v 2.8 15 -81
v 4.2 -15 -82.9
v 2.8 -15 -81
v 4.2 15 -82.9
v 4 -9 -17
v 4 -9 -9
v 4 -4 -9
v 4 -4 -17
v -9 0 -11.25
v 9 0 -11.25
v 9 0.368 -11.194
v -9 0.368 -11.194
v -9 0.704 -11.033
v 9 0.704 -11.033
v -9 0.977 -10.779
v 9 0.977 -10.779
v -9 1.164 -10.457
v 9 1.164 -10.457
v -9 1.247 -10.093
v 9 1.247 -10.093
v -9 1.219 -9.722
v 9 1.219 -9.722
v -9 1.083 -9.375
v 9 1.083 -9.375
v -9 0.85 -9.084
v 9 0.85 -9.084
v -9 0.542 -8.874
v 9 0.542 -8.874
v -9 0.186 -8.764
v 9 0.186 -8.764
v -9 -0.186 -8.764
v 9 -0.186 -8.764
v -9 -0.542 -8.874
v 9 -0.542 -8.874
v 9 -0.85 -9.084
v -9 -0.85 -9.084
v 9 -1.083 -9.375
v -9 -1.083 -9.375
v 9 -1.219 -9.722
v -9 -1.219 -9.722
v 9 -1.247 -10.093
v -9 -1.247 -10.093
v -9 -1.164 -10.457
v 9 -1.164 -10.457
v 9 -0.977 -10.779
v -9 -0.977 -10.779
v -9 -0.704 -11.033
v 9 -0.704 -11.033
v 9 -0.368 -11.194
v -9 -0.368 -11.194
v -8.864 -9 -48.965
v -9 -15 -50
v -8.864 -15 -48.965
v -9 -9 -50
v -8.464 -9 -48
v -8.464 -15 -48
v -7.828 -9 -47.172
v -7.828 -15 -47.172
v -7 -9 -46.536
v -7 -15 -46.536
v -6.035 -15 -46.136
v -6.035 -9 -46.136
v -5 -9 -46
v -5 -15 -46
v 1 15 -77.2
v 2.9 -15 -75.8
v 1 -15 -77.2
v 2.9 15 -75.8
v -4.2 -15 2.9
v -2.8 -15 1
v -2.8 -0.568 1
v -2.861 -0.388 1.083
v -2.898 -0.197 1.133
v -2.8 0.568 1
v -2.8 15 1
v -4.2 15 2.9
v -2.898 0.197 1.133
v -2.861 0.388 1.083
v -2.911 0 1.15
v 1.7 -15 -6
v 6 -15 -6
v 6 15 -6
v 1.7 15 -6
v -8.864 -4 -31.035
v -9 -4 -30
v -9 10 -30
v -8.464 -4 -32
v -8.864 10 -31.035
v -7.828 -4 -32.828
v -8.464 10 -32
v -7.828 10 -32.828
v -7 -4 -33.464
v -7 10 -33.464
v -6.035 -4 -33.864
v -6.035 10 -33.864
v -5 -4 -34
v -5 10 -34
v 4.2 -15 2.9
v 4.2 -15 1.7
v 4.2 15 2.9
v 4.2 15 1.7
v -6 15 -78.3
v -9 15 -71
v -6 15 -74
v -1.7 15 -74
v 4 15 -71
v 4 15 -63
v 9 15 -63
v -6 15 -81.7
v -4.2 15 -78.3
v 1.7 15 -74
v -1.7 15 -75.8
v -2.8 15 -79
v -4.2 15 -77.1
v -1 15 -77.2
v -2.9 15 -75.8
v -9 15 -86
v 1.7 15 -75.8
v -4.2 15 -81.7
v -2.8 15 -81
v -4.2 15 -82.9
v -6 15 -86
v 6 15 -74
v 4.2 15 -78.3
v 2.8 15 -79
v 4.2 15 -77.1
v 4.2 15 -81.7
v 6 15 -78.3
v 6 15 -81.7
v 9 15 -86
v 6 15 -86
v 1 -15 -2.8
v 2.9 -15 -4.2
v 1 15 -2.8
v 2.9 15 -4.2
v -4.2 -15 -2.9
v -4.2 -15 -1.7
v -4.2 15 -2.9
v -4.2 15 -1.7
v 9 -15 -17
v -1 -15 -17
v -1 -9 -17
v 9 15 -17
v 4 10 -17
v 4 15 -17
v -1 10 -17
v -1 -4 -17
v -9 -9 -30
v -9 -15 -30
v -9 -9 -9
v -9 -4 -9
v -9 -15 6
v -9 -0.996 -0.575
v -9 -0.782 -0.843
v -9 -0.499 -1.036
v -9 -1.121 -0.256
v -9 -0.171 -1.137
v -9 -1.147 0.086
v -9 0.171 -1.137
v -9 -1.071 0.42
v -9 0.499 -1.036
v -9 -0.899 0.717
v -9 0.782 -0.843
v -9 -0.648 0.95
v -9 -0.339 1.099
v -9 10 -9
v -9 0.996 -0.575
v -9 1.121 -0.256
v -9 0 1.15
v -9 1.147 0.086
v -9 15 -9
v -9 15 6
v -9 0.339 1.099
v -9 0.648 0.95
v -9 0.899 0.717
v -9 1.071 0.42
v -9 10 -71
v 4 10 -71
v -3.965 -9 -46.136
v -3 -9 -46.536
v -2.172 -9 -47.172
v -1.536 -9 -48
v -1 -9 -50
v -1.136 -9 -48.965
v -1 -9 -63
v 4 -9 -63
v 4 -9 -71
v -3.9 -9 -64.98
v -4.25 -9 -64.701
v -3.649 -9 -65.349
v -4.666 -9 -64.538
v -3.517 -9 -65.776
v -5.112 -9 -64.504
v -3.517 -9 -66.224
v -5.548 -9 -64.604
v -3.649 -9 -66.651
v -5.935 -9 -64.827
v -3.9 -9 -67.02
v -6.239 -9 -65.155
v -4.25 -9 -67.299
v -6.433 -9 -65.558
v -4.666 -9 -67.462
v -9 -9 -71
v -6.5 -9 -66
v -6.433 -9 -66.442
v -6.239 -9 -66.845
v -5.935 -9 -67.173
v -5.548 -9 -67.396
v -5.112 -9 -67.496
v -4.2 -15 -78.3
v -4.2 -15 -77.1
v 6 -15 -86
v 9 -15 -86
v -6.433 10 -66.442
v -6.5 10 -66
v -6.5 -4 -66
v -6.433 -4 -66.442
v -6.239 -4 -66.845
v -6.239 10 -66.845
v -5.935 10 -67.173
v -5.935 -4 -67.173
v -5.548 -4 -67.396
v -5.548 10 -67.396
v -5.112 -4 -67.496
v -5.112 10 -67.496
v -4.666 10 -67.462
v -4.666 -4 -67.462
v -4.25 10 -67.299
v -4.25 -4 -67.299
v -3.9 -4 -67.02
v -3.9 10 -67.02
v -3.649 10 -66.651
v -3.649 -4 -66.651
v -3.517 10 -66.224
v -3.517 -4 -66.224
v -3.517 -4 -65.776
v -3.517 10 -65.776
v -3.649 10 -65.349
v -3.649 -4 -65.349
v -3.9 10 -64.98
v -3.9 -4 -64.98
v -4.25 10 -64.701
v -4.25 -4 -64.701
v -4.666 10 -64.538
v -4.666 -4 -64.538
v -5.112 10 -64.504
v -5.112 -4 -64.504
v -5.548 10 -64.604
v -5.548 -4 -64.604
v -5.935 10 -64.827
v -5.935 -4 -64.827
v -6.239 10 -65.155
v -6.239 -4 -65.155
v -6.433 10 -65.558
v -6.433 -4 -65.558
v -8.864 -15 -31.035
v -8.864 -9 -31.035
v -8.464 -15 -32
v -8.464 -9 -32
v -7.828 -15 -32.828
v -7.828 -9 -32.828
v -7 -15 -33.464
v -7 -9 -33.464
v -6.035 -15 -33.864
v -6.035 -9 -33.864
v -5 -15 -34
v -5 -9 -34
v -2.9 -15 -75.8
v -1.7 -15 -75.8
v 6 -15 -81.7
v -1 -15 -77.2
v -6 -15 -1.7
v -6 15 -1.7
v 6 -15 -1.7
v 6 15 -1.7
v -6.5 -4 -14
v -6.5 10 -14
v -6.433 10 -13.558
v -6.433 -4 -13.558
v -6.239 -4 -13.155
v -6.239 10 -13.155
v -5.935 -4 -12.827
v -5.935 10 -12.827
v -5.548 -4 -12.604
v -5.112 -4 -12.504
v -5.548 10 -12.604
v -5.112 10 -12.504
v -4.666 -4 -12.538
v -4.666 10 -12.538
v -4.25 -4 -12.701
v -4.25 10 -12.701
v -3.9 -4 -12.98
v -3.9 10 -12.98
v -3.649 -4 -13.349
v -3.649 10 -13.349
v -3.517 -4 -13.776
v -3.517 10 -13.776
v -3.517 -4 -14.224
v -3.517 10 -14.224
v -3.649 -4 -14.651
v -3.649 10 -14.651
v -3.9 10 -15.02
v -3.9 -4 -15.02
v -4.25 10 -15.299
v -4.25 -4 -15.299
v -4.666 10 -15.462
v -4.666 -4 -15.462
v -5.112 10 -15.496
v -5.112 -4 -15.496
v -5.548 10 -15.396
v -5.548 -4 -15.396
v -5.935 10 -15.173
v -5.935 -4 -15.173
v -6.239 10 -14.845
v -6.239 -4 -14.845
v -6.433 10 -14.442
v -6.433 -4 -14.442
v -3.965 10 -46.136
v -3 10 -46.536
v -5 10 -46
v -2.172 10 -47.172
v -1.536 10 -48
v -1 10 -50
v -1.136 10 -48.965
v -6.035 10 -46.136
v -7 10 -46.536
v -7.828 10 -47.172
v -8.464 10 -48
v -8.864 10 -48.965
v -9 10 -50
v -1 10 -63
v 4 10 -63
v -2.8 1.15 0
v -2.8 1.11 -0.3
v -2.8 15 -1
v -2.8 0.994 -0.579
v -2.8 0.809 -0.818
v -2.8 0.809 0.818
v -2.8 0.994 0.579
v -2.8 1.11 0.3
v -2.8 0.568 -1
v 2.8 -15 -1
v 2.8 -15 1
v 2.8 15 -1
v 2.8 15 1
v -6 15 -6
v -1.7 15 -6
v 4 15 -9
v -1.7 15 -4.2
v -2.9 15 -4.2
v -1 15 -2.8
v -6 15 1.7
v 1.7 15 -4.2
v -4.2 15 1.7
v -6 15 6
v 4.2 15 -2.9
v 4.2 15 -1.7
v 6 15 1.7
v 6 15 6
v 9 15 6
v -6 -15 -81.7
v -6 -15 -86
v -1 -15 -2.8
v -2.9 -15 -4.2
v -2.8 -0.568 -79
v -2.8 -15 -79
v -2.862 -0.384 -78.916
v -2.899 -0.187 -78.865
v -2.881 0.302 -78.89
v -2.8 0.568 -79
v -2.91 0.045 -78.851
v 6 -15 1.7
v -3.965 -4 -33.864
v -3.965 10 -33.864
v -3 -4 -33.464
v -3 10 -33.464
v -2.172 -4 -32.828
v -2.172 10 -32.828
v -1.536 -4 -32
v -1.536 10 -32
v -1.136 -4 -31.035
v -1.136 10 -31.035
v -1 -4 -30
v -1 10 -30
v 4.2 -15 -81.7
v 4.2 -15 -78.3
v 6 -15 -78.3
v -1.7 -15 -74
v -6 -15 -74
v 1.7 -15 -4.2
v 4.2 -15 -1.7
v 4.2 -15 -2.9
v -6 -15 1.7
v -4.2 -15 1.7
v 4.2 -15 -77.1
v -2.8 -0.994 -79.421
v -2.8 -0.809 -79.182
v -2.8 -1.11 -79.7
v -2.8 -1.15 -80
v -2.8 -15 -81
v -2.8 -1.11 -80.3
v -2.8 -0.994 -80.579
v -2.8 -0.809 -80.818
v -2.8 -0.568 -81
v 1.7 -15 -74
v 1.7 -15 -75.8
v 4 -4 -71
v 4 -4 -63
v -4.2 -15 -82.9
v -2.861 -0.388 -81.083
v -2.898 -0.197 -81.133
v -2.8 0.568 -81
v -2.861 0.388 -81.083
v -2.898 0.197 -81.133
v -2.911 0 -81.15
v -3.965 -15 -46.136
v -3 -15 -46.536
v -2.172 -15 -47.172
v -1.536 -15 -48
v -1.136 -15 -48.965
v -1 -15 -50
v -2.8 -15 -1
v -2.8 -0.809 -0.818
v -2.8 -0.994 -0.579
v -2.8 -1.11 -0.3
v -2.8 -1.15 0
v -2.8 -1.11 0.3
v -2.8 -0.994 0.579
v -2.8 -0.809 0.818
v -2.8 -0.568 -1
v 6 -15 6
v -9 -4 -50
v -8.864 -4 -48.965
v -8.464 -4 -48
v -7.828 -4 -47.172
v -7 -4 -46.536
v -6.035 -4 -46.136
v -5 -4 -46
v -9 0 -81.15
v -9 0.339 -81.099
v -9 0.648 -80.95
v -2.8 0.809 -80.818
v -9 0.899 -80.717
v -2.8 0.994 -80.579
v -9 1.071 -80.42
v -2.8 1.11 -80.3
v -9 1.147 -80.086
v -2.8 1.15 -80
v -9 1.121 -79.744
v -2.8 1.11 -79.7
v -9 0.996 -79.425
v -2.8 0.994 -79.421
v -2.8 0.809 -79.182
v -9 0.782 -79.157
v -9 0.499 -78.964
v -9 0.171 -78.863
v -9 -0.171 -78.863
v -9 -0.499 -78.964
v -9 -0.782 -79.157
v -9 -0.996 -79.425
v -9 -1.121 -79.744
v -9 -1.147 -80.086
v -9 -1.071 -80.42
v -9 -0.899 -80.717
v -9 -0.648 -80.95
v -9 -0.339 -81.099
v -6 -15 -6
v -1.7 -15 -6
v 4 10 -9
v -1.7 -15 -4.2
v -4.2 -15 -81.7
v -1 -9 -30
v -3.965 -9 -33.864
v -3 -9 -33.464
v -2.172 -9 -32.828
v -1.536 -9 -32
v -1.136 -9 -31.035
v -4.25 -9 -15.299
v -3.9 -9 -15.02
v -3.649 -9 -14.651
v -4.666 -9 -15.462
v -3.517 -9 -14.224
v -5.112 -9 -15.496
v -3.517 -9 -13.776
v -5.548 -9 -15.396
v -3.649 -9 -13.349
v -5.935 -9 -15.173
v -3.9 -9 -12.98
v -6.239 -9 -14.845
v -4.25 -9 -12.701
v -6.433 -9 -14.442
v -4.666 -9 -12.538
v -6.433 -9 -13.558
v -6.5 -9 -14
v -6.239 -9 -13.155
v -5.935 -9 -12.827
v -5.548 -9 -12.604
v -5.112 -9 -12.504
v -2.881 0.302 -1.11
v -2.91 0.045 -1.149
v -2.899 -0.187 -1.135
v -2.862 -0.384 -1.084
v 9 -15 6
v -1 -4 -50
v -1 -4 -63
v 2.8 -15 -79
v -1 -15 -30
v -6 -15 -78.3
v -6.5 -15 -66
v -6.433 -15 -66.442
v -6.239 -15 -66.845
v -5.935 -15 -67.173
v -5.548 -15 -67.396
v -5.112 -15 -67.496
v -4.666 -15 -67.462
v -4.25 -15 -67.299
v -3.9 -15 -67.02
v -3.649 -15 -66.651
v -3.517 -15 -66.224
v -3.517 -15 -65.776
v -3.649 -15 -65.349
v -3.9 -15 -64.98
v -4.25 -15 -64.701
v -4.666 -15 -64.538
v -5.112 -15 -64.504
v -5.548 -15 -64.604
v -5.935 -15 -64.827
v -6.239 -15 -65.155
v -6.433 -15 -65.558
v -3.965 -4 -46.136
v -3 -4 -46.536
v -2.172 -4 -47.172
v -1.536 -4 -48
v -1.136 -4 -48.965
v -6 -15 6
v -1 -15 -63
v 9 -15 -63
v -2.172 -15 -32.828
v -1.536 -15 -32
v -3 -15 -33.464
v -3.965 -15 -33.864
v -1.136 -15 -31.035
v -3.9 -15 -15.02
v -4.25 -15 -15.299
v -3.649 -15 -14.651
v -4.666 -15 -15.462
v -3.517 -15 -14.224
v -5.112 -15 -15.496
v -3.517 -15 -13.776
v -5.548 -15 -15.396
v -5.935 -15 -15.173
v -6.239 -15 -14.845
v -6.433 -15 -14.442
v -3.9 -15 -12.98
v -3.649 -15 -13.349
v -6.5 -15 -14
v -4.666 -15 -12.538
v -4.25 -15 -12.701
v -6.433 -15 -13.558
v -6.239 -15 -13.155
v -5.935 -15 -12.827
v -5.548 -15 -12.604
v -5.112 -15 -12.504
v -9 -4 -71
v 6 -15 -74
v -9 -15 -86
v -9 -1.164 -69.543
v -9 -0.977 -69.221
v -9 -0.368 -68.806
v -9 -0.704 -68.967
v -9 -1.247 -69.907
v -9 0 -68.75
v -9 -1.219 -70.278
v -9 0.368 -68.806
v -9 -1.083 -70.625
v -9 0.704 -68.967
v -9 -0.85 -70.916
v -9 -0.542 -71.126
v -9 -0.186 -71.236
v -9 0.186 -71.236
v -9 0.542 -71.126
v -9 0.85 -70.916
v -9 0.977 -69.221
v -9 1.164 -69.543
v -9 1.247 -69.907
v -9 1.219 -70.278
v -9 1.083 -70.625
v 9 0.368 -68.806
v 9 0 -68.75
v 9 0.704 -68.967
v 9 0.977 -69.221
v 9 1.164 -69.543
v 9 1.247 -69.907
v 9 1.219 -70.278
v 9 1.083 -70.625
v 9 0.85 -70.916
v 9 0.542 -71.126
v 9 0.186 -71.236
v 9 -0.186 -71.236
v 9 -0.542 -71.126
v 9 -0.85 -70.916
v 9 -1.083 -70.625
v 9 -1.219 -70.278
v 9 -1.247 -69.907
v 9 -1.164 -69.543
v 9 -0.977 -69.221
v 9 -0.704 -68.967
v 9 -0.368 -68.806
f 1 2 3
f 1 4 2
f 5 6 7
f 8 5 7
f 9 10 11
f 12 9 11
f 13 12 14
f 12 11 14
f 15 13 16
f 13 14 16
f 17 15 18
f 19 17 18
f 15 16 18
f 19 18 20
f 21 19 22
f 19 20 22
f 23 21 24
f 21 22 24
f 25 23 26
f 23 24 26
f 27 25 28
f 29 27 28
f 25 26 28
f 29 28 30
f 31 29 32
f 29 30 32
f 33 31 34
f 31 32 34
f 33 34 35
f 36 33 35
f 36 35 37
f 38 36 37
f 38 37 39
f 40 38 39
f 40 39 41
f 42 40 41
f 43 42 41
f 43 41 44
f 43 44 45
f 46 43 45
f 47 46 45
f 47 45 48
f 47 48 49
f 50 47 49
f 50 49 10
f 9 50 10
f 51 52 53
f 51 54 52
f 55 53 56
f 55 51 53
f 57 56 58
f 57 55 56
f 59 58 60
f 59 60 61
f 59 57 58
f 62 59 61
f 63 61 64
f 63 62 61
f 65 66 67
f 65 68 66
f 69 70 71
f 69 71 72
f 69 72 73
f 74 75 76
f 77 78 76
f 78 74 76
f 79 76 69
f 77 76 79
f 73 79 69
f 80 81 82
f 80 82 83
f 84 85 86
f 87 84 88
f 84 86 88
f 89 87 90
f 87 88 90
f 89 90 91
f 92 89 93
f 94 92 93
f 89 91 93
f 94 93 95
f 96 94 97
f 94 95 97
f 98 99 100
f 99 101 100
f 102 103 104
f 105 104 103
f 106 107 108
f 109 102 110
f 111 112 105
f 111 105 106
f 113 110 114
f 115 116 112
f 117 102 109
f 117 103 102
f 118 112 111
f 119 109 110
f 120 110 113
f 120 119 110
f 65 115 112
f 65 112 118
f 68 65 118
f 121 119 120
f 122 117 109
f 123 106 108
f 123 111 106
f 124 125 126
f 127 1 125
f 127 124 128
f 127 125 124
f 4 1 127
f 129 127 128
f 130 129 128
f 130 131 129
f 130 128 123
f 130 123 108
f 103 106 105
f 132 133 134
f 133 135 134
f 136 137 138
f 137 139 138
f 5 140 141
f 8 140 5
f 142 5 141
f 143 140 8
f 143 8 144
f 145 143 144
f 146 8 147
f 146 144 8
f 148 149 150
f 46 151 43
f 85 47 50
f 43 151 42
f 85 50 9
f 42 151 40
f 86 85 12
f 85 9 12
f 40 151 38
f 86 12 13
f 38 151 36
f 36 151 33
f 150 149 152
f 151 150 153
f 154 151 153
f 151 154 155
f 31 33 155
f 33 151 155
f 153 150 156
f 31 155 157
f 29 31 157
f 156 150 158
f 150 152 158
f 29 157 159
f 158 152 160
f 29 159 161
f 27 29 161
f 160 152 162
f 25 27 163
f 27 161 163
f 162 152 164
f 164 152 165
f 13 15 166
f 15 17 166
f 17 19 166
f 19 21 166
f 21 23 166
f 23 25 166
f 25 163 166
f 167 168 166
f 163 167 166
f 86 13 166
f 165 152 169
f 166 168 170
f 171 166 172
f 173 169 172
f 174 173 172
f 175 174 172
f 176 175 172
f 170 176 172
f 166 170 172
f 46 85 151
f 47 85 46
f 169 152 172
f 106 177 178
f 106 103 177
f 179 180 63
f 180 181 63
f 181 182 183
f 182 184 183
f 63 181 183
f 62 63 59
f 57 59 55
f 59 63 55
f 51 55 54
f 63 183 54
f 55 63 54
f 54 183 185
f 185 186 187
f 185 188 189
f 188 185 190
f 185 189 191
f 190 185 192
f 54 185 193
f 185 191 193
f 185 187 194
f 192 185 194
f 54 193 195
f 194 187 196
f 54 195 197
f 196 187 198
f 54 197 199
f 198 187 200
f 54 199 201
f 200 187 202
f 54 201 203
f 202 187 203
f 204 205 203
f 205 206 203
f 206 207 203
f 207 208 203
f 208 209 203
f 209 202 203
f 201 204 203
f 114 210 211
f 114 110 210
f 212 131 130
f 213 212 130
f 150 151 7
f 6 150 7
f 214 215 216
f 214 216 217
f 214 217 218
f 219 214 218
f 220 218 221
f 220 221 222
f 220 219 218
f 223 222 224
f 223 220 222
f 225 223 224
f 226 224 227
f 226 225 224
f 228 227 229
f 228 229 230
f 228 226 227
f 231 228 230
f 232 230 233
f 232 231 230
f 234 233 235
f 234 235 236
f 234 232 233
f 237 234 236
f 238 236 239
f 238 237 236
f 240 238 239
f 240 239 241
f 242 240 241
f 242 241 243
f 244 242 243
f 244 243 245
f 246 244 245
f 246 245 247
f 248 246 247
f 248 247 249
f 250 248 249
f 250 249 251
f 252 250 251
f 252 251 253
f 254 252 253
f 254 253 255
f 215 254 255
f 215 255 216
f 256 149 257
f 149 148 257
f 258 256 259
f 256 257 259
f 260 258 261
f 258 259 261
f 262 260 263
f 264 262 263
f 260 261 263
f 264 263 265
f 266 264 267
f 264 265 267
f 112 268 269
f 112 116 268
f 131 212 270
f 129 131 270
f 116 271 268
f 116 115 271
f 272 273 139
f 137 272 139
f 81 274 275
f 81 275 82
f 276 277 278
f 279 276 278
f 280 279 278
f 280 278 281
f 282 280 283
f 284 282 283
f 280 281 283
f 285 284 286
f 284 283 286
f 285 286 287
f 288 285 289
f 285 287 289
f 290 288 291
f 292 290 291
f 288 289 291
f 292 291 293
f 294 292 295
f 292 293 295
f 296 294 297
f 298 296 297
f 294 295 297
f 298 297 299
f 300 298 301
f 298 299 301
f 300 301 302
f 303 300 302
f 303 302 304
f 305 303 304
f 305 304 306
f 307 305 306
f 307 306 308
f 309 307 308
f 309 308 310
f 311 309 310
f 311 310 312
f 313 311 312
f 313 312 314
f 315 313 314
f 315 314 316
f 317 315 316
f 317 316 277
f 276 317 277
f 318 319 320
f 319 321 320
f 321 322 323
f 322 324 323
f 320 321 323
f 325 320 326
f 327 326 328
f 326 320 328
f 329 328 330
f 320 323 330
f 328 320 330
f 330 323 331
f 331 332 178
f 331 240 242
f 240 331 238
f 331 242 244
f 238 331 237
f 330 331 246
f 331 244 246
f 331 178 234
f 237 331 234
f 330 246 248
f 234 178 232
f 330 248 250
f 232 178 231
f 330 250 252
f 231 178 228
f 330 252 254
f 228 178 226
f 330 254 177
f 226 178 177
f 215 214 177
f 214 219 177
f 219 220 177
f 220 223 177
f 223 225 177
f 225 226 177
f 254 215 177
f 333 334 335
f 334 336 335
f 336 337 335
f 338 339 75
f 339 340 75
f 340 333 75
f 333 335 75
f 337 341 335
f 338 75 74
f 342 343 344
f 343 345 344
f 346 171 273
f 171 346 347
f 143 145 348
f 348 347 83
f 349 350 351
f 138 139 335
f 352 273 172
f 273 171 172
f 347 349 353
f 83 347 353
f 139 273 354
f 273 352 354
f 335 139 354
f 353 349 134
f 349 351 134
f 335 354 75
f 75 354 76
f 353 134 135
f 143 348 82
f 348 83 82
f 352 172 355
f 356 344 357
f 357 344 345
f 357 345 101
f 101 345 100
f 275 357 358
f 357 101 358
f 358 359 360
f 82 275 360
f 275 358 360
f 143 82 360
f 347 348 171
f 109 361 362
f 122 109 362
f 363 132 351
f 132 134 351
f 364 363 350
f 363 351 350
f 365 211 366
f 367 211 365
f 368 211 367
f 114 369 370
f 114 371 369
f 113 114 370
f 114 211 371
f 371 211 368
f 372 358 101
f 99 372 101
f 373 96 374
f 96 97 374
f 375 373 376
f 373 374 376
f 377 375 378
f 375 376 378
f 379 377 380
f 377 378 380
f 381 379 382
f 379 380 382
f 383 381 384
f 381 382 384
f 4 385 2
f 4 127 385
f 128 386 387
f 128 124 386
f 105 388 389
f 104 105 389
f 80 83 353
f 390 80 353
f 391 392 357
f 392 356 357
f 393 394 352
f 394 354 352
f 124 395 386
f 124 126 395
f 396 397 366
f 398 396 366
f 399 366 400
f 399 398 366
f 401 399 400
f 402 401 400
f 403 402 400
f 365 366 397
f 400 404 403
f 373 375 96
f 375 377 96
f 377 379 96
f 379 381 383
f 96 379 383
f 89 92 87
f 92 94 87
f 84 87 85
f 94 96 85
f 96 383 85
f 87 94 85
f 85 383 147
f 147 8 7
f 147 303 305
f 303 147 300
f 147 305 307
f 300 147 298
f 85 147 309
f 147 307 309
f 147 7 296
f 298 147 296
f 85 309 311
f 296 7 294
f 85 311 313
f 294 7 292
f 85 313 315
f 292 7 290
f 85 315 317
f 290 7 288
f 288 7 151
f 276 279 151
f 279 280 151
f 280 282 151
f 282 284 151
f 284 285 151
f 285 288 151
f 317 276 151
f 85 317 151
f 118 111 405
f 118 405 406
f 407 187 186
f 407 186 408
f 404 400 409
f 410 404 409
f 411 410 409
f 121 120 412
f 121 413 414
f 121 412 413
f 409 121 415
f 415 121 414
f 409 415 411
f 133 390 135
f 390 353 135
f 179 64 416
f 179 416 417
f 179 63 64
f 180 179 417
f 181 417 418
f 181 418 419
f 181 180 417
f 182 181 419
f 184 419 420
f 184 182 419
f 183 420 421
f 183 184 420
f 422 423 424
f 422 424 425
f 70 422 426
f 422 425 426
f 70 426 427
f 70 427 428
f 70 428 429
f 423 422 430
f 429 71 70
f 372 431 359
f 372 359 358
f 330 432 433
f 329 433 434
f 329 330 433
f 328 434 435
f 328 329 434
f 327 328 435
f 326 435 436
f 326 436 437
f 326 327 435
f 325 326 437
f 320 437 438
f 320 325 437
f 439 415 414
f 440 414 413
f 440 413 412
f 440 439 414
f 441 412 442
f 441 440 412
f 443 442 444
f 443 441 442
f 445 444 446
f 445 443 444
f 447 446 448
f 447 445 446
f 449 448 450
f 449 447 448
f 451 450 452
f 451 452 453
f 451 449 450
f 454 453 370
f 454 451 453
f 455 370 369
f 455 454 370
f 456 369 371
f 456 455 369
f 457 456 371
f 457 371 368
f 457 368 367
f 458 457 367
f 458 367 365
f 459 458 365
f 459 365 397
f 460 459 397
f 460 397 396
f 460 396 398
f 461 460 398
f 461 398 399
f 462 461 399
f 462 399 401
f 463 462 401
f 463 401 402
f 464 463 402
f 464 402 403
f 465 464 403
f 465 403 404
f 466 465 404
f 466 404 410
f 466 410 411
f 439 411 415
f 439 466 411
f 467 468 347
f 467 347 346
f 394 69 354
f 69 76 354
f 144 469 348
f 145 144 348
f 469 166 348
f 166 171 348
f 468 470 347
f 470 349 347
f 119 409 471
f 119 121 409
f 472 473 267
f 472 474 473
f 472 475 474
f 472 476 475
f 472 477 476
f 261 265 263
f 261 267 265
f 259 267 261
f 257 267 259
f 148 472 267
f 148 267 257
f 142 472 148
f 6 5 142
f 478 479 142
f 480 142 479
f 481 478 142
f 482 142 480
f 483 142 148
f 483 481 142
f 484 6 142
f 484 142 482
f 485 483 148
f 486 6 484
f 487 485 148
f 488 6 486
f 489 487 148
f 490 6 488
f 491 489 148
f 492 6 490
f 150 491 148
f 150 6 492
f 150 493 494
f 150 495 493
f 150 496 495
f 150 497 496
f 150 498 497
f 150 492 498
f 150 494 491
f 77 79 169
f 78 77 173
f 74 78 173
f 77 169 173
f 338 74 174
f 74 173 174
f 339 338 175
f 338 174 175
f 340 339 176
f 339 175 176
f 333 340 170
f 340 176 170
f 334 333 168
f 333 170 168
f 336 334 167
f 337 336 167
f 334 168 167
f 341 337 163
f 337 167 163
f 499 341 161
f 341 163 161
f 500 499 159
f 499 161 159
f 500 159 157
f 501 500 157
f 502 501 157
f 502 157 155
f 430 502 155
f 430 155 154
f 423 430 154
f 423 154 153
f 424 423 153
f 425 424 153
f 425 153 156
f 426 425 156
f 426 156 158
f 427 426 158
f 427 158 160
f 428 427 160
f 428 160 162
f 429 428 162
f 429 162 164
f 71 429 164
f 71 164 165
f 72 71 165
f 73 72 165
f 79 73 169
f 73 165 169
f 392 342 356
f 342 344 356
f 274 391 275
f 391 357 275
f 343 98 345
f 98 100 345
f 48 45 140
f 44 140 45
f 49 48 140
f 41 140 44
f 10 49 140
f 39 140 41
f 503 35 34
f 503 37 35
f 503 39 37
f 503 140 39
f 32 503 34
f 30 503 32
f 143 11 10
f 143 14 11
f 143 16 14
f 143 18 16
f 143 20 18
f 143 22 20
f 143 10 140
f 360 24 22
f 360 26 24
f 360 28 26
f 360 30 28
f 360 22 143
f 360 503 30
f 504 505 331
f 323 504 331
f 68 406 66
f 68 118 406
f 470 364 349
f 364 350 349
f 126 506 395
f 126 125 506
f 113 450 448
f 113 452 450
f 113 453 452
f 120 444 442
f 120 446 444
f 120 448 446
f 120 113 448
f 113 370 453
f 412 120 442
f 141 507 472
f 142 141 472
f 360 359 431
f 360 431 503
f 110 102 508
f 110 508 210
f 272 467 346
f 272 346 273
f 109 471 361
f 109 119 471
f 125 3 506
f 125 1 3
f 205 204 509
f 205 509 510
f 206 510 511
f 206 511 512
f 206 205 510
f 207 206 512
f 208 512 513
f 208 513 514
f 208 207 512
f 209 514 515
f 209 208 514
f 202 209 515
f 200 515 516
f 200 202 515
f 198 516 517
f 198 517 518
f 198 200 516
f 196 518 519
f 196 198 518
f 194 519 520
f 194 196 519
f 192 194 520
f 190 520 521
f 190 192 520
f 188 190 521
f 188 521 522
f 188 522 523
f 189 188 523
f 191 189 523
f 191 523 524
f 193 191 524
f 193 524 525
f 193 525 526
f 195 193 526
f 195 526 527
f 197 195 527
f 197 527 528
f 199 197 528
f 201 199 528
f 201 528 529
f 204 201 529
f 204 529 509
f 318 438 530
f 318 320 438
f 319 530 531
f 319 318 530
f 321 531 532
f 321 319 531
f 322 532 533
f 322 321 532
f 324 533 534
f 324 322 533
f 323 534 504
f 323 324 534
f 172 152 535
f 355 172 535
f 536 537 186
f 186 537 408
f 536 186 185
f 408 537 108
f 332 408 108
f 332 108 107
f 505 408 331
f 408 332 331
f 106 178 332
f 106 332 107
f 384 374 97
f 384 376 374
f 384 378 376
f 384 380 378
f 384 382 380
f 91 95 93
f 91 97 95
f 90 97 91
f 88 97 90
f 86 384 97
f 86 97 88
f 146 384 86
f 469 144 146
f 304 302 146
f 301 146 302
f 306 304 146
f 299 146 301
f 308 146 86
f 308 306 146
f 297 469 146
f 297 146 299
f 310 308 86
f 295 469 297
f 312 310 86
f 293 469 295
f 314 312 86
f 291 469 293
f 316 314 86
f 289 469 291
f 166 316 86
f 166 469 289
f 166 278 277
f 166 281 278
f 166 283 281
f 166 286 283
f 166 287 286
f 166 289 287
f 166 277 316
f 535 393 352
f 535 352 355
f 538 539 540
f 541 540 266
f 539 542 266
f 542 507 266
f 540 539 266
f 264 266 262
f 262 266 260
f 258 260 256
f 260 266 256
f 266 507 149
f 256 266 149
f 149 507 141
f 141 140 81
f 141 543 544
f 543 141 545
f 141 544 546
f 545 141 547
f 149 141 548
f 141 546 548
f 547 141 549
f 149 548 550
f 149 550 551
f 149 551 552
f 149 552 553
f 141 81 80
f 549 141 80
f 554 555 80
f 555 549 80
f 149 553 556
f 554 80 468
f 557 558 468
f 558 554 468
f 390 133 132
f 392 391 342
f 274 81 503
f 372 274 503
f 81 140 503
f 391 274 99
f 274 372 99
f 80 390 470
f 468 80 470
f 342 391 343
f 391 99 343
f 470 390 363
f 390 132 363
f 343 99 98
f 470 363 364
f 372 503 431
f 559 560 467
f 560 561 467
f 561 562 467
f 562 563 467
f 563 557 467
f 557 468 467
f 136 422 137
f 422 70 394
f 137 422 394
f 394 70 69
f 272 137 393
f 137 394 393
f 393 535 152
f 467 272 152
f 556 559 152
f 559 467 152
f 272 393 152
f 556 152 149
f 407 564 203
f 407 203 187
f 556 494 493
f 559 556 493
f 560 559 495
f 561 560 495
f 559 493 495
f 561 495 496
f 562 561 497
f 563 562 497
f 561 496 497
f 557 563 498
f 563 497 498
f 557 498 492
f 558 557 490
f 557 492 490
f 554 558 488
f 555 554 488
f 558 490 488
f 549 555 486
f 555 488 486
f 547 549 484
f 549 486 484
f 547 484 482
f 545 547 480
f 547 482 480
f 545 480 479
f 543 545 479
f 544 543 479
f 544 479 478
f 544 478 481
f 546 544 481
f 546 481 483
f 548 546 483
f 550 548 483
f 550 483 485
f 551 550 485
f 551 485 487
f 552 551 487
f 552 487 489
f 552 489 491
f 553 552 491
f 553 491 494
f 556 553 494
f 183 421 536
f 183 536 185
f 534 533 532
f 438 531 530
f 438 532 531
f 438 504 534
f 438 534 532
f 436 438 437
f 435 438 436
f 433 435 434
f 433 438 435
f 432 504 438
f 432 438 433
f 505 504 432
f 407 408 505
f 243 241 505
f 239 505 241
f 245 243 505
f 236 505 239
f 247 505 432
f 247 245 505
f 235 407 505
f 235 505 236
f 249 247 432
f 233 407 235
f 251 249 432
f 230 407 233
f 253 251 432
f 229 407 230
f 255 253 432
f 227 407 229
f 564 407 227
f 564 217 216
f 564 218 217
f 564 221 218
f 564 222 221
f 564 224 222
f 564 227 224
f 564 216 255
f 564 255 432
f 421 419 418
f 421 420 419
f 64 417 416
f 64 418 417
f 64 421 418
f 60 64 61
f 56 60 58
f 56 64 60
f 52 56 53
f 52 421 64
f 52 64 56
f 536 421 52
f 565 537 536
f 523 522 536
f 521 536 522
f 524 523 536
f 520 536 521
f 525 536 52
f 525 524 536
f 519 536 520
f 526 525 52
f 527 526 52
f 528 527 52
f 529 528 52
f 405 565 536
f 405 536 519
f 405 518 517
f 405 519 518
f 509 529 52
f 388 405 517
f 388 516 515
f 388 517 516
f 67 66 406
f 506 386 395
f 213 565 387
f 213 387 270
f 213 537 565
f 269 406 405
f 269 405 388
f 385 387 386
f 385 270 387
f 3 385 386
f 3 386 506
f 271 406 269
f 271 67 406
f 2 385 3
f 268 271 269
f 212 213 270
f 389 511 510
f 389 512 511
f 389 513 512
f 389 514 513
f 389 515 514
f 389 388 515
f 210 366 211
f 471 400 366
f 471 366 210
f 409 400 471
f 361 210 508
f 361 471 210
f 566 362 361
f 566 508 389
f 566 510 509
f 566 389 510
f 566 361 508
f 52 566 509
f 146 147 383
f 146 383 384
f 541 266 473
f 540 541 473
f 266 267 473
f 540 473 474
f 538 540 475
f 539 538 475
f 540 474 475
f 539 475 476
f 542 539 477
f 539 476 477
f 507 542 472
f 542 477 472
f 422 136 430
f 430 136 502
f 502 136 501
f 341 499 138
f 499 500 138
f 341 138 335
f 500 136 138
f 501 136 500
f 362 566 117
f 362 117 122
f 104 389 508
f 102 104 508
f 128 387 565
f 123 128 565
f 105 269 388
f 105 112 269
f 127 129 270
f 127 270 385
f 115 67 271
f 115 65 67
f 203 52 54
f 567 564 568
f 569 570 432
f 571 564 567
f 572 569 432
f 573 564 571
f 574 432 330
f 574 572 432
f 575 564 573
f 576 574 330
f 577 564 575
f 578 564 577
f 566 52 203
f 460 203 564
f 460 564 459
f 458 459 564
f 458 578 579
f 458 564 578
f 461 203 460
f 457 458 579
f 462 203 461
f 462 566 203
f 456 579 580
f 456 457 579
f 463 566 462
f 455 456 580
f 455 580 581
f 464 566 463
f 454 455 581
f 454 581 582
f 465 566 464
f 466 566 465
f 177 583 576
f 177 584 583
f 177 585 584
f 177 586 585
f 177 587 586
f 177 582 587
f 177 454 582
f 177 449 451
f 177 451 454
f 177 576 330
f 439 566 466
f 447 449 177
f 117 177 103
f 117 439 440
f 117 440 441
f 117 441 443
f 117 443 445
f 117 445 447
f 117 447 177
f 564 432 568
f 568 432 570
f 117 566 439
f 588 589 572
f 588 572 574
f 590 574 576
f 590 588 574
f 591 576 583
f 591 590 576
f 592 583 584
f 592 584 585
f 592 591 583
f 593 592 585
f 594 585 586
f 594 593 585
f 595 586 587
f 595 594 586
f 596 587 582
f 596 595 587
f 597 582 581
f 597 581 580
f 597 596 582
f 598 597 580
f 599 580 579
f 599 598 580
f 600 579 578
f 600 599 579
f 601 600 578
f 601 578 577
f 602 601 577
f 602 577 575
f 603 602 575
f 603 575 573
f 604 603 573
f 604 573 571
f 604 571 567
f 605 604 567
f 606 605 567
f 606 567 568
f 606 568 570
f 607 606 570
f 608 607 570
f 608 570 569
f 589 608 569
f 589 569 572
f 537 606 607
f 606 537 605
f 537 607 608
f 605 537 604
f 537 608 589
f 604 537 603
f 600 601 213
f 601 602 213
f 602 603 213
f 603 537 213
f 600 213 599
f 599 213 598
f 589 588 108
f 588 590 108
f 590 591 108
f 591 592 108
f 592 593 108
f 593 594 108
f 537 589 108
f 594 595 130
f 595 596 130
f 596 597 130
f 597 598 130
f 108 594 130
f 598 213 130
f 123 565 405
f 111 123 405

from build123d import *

# Parameters (mm, degrees)
BOSS_EXTRU_6_DEPTH           = 15
R_P_TITION_CIRCULAIRE3_COUNT = 3
R_P_TITION_CIRCULAIRE3_ANGLE = 180
ESQUISSE9_W                  = 18
ESQUISSE9_H                  = 3
ENL_V_MAT_EXTRU_1_DEPTH      = 33.588341474
ESQUISSE10_W                 = 8
ESQUISSE10_H                 = 14
ESQUISSE10_H_2               = 6
BOSS_EXTRU_7_DEPTH           = 25
ESQUISSE12_W                 = 10
ESQUISSE12_H                 = 6
ESQUISSE12_H_2               = 14
BOSS_EXTRU_8_DEPTH           = 8
CONG_1_R                     = 4
ESQUISSE11_R                 = 1.5
ENL_V_MAT_EXTRU_2_DEPTH      = 47.227697325
ESQUISSE13_W                 = 5
ESQUISSE13_H                 = 30
BOSS_EXTRU_9_DEPTH           = 8
ESQUISSE16_R                 = 1.25
ENL_V_MAT_EXTRU_3_DEPTH      = 42.291645644
ENL_V_MAT_EXTRU_4_REACH      = 43.292
ESQUISSE17_R                 = 1.15


with BuildPart() as part:
    # Esquisse8 → Boss.-Extru.6 (new, symmetric)
    with BuildSketch(Plane(origin=(0, 0, 0), x_dir=(1, 0, 0), z_dir=(0, 1, 0))):
        Polygon((-6, 1.7), (-4.2, 1.7), (-4.2, 2.9), (-2.8, 1), (-2.8, -1), (-4.2, -2.9), (-4.2, -1.7), (-6, -1.7), (-6, -9), (-9, -9), (-9, 9), (-6, 9), align=None)
    extrude(amount=BOSS_EXTRU_6_DEPTH, both=True)


with BuildPart() as r_p_tition_circulaire3_1:
    # Répétition circulaire3: pattern copy
    add(part.part.rotate(Axis((0, 0, 0), (0, -1, 0)), 1 * R_P_TITION_CIRCULAIRE3_ANGLE / (R_P_TITION_CIRCULAIRE3_COUNT - 1)))


with BuildPart() as r_p_tition_circulaire3_2:
    # Répétition circulaire3: pattern copy
    add(part.part.rotate(Axis((0, 0, 0), (0, -1, 0)), 2 * R_P_TITION_CIRCULAIRE3_ANGLE / (R_P_TITION_CIRCULAIRE3_COUNT - 1)))


with BuildPart() as enl_v_mat_extru_1_tool:
    # Esquisse9 → Enlèv. mat.-Extru.1 (new, through all)
    with BuildSketch(Plane(origin=(0, 15, 0), x_dir=(1, 0, 0), z_dir=(0, 1, 0))):
        with Locations((0, -7.5)):
            Rectangle(ESQUISSE9_W, ESQUISSE9_H)
    extrude(amount=-ENL_V_MAT_EXTRU_1_DEPTH)


with BuildPart() as part_1:
    add(part.part)

    # Enlèv. mat.-Extru.1: cut by enl_v_mat_extru_1_tool
    add(enl_v_mat_extru_1_tool.part, mode=Mode.SUBTRACT)


    add(r_p_tition_circulaire3_1.part)  # Boss.-Extru.7 merges Répétition circulaire3_1
    # Esquisse10 → Boss.-Extru.7 (add)
    with BuildSketch(Plane(origin=(0, 0, -9), x_dir=(-1, 0, 0), z_dir=(0, 0, -1))):
        with Locations((5, 3)):
            Rectangle(ESQUISSE10_W, ESQUISSE10_H)
        with Locations((5, -12)):
            Rectangle(ESQUISSE10_W, ESQUISSE10_H_2)
    extrude(amount=BOSS_EXTRU_7_DEPTH)



with BuildPart() as r_p_tition_circulaire3_2_1:
    add(r_p_tition_circulaire3_2.part)

    # Enlèv. mat.-Extru.1: cut by enl_v_mat_extru_1_tool
    add(enl_v_mat_extru_1_tool.part, mode=Mode.SUBTRACT)


with BuildPart() as part_2:
    add(part_1.part)

    add(r_p_tition_circulaire3_2_1.part)  # Boss.-Extru.8 merges Répétition circulaire3_2
    # Esquisse12 → Boss.-Extru.8 (add)
    with BuildSketch(Plane(origin=(0, 0, -9), x_dir=(-1, 0, 0), z_dir=(0, 0, -1))):
        with Locations((-4, -12)):
            Rectangle(ESQUISSE12_W, ESQUISSE12_H)
        with Locations((-4, 3)):
            Rectangle(ESQUISSE12_W, ESQUISSE12_H_2)
    extrude(amount=BOSS_EXTRU_8_DEPTH)

    # Congé1
    cong_1_edges = [part_2.edges().sort_by_distance(p)[0] for p in [
        (-9, 3, -34),
        (-1, -12, -34),
        (-9, -12, -34),
        (-1, 3, -34),
    ]]
    fillet(cong_1_edges, radius=CONG_1_R - 0.0001)  # a hair under: the kernel refuses the full size

    # Esquisse11 → Enlèv. mat.-Extru.2 (cut, through all)
    with BuildSketch(Plane(origin=(0, 15, 0), x_dir=(1, 0, 0), z_dir=(0, 1, 0))):
        with Locations(Location((-5, 14, 0), (0, 0, 180))):
            Circle(ESQUISSE11_R)
    extrude(amount=-ENL_V_MAT_EXTRU_2_DEPTH, mode=Mode.SUBTRACT)

    # Esquisse13 → Boss.-Extru.9 (add)
    with BuildSketch(Plane(origin=(0, 0, -9), x_dir=(-1, 0, 0), z_dir=(0, 0, -1))):
        with Locations((-6.5, 0)):
            Rectangle(ESQUISSE13_W, ESQUISSE13_H)
    extrude(amount=BOSS_EXTRU_9_DEPTH)

    # Esquisse16 → Enlèv. mat.-Extru.3 (cut, through all)
    with BuildSketch(Plane(origin=(9, 0, 0), x_dir=(0, 0, -1), z_dir=(1, 0, 0))):
        with Locations((10, 0)):
            Circle(ESQUISSE16_R)
    extrude(amount=-ENL_V_MAT_EXTRU_3_DEPTH, mode=Mode.SUBTRACT)

    # Esquisse17 → Enlèv. mat.-Extru.4 (cut, up to next)
    with BuildSketch(Plane.ZY.offset(9), mode=Mode.PRIVATE) as enl_v_mat_extru_4_sk1:
        Circle(ESQUISSE17_R)
    enl_v_mat_extru_4_tool1 = extrude(enl_v_mat_extru_4_sk1.sketch, amount=-ENL_V_MAT_EXTRU_4_REACH, mode=Mode.PRIVATE) & part_2.part
    add(enl_v_mat_extru_4_tool1.solids().sort_by_distance((-9, 0, 0))[0], mode=Mode.SUBTRACT)


with BuildPart() as body_2:
    # Symétrie2: mirrored copy
    add(part_2.part.mirror(Plane.XY.offset(-40)))


solid = Compound([part_2.part, body_2.part])
